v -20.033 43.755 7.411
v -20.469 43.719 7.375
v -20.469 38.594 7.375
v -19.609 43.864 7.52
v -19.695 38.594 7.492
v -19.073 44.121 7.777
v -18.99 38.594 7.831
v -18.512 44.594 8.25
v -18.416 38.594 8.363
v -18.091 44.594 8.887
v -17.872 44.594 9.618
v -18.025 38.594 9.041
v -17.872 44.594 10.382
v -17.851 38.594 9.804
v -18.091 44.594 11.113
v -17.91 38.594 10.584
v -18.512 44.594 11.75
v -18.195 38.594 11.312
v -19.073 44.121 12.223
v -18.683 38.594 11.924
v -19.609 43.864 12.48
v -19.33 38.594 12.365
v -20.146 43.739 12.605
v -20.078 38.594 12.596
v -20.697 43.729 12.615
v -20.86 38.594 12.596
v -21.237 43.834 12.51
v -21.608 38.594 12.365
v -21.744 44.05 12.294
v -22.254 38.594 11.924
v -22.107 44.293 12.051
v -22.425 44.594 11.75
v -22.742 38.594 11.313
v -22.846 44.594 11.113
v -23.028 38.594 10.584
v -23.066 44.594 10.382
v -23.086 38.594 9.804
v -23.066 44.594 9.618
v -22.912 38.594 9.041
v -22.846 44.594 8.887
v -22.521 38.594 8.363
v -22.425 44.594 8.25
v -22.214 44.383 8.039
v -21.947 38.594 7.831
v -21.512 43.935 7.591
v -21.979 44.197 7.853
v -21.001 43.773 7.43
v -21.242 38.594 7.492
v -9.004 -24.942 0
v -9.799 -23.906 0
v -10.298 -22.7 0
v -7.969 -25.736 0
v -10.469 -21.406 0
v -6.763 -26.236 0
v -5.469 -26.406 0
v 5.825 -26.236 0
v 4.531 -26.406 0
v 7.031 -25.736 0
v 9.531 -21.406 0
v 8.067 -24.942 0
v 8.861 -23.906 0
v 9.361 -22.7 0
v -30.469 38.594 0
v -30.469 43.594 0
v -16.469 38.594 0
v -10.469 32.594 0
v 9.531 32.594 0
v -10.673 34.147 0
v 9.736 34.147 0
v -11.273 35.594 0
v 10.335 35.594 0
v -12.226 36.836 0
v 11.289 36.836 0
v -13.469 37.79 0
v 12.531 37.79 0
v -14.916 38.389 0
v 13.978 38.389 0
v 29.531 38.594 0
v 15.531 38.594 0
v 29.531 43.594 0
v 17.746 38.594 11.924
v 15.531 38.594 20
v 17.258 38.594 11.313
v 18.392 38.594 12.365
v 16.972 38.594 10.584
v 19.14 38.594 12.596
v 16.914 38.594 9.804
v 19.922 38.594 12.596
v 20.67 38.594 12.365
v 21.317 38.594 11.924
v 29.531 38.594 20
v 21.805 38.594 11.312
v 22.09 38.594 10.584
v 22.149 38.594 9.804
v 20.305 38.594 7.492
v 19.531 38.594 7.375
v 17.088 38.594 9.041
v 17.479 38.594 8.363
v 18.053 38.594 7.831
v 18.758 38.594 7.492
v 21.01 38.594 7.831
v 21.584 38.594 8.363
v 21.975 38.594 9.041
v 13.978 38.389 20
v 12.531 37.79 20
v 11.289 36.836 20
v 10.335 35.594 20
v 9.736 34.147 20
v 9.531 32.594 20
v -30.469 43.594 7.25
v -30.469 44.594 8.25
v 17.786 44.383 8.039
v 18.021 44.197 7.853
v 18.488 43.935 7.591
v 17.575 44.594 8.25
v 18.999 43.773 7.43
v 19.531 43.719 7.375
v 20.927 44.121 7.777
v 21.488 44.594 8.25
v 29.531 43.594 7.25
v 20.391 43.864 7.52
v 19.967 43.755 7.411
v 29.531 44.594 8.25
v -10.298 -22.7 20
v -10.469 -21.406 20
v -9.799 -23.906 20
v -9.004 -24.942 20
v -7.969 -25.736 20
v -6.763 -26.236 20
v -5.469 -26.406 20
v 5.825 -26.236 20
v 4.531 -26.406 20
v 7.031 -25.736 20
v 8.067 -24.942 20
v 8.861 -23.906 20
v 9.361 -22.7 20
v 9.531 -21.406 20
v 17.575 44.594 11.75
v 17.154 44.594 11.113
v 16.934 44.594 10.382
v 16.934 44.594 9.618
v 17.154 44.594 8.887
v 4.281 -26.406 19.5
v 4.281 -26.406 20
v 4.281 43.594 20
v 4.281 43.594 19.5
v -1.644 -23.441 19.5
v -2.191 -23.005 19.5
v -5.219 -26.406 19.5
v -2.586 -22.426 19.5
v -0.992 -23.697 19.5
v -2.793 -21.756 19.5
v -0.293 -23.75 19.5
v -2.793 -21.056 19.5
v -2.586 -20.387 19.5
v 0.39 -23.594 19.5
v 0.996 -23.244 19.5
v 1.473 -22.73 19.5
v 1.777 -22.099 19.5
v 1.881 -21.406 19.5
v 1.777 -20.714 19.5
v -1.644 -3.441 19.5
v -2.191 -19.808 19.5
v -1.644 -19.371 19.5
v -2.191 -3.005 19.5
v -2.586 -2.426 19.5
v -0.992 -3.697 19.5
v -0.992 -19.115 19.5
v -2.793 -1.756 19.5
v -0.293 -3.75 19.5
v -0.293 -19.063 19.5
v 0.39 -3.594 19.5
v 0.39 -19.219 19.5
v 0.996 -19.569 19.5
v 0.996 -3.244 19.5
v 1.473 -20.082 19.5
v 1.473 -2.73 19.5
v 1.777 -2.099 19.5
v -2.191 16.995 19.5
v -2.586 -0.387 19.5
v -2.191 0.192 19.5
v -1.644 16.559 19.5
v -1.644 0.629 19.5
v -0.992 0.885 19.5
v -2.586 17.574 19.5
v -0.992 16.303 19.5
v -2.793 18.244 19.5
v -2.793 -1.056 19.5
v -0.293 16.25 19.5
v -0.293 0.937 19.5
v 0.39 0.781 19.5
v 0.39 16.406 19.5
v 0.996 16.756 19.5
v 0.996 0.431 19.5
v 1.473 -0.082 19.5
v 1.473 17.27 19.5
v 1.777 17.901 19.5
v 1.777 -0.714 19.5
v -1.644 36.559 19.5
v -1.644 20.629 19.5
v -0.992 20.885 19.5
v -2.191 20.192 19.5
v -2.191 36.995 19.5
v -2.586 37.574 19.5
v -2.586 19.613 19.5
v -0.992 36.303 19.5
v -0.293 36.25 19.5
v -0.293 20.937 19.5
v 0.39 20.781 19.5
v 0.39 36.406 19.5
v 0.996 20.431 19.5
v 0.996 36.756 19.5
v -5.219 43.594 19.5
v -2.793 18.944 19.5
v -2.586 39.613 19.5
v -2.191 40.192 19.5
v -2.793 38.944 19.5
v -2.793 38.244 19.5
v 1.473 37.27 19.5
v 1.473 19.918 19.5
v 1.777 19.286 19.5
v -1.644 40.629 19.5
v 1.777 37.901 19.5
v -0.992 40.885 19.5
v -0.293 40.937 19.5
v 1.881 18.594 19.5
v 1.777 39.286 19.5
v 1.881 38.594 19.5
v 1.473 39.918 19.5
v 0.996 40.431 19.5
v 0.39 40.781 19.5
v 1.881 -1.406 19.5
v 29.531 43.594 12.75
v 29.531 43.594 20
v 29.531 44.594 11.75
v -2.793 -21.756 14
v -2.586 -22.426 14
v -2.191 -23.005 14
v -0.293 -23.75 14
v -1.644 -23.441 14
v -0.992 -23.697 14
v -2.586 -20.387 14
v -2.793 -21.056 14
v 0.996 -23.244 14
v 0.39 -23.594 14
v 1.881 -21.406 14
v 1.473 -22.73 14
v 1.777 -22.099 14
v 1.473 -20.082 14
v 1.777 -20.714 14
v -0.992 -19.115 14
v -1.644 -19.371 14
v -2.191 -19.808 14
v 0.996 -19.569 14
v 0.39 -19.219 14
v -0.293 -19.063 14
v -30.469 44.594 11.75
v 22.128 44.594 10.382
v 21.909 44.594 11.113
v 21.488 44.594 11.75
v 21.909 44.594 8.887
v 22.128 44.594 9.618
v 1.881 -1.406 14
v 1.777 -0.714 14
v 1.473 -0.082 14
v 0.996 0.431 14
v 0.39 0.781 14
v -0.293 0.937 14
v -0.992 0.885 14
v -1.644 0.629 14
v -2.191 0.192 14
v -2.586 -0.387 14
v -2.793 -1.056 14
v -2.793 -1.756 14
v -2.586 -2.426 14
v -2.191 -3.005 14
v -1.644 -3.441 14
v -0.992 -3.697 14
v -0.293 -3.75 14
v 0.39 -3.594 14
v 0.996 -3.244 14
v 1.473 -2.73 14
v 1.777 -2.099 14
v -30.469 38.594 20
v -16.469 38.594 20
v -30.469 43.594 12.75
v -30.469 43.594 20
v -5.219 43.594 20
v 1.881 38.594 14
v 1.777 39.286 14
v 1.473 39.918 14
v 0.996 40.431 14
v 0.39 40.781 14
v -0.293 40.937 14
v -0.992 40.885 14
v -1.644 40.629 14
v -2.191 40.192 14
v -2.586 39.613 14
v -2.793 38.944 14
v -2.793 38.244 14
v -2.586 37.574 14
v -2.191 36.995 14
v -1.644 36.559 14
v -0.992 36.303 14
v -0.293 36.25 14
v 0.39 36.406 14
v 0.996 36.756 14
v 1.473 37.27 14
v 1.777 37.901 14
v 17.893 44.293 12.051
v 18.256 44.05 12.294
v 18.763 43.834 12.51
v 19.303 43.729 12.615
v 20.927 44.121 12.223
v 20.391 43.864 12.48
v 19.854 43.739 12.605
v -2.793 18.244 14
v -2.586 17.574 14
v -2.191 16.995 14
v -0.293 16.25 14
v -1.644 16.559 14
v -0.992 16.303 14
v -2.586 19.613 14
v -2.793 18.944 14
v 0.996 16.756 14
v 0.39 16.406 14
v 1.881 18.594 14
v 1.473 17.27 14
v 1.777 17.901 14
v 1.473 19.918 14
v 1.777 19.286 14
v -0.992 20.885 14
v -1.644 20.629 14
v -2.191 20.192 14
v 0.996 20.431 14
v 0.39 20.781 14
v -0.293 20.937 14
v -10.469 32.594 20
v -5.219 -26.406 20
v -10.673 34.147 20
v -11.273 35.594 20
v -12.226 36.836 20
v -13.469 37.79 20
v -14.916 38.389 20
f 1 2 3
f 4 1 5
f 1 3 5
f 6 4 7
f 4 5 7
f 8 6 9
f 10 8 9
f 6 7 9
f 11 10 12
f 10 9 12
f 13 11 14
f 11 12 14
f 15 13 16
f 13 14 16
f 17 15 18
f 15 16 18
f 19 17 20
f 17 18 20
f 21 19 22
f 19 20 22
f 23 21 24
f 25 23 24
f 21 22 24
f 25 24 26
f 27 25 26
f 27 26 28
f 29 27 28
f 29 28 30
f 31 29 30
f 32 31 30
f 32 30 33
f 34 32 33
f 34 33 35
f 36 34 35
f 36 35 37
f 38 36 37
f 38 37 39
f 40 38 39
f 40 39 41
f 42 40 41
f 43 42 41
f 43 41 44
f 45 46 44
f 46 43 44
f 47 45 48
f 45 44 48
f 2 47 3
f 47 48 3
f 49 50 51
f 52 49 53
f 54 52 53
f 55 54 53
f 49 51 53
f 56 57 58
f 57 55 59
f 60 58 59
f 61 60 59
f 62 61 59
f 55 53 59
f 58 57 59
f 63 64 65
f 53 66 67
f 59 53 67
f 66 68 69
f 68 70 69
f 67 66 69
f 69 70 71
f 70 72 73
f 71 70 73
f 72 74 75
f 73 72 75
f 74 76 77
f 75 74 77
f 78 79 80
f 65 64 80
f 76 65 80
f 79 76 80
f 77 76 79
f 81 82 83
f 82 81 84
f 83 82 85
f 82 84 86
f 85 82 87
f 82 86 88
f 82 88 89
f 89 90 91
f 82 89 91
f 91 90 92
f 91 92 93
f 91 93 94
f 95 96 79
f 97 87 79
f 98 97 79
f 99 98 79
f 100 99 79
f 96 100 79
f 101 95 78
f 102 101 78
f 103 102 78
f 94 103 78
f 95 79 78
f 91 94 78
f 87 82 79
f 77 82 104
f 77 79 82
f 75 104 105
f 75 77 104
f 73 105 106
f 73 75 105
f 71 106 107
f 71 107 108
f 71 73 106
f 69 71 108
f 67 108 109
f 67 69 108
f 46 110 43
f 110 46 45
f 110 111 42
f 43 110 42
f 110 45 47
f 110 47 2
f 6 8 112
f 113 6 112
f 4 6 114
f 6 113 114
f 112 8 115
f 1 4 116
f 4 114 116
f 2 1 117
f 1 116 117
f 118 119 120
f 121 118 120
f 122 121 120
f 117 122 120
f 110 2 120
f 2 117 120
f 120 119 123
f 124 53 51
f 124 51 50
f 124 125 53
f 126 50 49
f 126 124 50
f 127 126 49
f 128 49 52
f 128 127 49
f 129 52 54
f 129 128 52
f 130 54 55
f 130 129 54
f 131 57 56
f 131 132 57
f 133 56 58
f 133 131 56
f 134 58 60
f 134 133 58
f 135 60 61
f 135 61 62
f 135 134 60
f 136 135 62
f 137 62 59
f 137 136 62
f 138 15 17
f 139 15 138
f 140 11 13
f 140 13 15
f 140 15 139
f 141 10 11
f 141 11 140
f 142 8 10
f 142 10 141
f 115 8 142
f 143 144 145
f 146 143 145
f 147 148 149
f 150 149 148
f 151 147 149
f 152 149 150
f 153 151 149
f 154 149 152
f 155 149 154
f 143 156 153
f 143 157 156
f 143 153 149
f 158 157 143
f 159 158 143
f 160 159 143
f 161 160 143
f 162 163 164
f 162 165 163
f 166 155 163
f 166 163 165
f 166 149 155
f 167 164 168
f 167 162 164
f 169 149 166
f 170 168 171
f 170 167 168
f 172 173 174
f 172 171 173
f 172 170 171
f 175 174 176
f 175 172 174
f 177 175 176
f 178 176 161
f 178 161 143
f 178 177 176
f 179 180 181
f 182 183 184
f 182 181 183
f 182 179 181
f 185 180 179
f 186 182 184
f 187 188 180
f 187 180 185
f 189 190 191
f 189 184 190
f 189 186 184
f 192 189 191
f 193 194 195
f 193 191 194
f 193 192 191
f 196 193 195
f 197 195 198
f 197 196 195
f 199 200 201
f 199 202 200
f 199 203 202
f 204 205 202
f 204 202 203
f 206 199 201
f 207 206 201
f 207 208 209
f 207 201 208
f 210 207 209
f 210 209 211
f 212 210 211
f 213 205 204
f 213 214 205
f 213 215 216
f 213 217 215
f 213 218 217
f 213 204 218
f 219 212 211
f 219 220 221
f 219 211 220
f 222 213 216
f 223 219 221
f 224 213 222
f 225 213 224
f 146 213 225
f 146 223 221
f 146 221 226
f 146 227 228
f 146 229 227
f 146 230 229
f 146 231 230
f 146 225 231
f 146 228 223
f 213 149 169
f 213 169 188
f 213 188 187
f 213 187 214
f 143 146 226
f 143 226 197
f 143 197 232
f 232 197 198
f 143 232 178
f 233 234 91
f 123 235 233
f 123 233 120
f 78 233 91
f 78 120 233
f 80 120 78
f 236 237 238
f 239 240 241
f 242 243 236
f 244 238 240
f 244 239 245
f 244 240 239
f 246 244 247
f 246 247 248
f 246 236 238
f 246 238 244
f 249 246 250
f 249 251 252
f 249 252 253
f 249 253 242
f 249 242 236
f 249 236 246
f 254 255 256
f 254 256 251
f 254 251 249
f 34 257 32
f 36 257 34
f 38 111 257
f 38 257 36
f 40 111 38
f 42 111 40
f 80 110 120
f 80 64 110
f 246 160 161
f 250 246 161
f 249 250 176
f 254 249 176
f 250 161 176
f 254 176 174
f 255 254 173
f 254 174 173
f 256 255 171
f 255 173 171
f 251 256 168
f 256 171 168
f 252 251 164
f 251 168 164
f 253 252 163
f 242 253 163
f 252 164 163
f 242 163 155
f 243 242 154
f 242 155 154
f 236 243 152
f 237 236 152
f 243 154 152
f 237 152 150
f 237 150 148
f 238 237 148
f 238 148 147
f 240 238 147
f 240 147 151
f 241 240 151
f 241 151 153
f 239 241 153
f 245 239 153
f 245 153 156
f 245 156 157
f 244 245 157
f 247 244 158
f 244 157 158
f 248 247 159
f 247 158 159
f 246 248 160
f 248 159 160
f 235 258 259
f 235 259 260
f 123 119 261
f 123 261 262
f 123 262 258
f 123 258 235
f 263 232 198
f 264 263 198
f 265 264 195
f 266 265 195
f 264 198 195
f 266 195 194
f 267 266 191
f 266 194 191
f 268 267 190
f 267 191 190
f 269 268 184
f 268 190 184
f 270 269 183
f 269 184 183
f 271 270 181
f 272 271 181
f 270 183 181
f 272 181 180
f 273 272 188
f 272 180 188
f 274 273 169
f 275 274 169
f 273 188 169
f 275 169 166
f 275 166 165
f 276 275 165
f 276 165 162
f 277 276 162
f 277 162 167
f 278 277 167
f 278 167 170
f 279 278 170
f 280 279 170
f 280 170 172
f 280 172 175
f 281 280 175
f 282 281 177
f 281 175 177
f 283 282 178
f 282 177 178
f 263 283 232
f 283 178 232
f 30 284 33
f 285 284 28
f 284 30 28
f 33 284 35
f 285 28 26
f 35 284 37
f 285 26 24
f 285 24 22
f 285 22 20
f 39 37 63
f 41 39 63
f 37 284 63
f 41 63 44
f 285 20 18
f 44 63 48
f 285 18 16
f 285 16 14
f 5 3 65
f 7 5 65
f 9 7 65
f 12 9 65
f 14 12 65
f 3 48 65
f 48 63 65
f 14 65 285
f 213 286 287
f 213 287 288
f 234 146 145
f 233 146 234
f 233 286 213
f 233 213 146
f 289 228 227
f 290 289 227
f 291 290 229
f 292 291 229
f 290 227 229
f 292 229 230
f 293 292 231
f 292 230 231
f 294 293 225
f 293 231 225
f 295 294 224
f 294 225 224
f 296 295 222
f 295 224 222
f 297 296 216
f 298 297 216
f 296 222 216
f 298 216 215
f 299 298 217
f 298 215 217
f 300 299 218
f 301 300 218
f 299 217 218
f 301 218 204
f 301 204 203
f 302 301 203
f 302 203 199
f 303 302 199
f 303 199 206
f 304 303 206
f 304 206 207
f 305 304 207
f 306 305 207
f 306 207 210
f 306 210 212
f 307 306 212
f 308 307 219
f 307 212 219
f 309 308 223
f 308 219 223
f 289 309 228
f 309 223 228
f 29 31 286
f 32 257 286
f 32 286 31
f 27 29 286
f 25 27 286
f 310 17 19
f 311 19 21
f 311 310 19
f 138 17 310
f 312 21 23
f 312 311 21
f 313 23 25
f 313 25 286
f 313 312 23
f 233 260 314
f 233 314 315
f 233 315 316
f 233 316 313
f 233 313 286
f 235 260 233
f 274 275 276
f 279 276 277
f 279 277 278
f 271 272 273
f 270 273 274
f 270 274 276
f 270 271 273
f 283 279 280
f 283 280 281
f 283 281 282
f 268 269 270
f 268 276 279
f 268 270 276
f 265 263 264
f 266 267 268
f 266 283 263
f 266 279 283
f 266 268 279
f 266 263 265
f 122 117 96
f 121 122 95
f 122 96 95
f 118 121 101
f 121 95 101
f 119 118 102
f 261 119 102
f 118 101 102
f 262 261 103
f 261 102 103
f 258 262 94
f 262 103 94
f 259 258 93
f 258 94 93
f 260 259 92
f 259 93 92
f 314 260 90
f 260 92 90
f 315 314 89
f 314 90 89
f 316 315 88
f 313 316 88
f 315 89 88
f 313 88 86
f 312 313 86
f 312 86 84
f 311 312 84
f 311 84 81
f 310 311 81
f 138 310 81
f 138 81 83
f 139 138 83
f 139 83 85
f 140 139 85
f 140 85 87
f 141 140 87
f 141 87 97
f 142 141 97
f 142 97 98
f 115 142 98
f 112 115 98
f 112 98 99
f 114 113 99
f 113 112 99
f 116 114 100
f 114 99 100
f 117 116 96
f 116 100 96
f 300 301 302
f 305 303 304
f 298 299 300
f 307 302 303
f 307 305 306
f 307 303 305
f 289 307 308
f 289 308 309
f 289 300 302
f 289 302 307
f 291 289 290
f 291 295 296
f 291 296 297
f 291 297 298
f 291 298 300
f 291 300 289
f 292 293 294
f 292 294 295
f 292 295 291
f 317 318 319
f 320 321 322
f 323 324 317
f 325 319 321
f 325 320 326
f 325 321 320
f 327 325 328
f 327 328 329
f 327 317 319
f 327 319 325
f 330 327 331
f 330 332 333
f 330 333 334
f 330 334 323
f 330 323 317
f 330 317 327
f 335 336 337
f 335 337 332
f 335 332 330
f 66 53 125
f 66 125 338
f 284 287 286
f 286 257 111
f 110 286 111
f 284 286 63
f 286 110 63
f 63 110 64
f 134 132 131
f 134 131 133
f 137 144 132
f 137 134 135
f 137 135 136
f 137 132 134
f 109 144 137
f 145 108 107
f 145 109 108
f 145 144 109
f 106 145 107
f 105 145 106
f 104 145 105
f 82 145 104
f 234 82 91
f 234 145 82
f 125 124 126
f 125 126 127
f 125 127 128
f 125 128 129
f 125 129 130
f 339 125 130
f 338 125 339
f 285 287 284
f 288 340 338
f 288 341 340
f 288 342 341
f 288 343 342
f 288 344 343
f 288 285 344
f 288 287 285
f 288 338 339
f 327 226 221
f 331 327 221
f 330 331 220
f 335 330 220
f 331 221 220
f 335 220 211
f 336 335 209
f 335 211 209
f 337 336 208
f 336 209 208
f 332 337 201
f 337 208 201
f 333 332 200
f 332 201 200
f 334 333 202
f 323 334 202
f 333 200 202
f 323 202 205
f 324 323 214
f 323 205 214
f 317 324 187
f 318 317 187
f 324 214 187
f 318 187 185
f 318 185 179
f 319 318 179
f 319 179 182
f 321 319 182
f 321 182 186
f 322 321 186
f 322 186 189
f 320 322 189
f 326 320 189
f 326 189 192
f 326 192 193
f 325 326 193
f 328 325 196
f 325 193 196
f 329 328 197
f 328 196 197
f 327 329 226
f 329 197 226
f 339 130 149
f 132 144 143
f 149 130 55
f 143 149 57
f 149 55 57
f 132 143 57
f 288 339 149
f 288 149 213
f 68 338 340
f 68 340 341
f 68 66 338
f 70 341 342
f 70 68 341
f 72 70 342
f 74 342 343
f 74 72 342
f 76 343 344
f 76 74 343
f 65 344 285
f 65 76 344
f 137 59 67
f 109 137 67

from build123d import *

# Parameters (mm, degrees)
SKETCH2_W           = 20
SKETCH2_H           = 70
BOSS_EXTRUDE1_DEPTH = 20
SKETCH3_W           = 9.5
SKETCH3_H           = 70
CUT_EXTRUDE1_DEPTH  = 0.5
SKETCH4_R           = 2.35
CUT_EXTRUDE2_DEPTH  = 5.5
SKETCH5_W           = 20
SKETCH5_H           = 20
BOSS_EXTRUDE2_DEPTH = 5
FILLET1_R           = 6
FILLET2_R           = 6
SKETCH6_W           = 60
SKETCH6_H           = 5.5
BOSS_EXTRUDE3_DEPTH = 1
CHAMFER1_SIZE       = 1
SKETCH7_R           = 2.625
CUT_EXTRUDE3_DEPTH  = 75.520767082
FILLET3_R           = 5
FILLET4_R           = 5


with BuildPart() as part:
    # Sketch2 → Boss-Extrude1 (new body)
    with BuildSketch(Plane.XY):
        with Locations((-0.46875, 8.59375)):
            Rectangle(SKETCH2_W, SKETCH2_H)
    extrude(amount=BOSS_EXTRUDE1_DEPTH)

    # Sketch3 → Cut-Extrude1 (cut)
    with BuildSketch(Plane.XY.offset(20)):
        with Locations((-0.46875, 8.59375)):
            Rectangle(SKETCH3_W, SKETCH3_H)
    extrude(amount=-CUT_EXTRUDE1_DEPTH, mode=Mode.SUBTRACT)

    # Sketch4 → Cut-Extrude2 (cut)
    with BuildSketch(Plane.XY.offset(19.5)):
        with Locations((-0.46875, 38.59375)):
            Circle(SKETCH4_R)
        with Locations((-0.46875, 18.59375)):
            Circle(SKETCH4_R)
        with Locations((-0.46875, -1.40625)):
            Circle(SKETCH4_R)
        with Locations((-0.46875, 78.59375)):
            Circle(SKETCH4_R)
        with Locations((-0.46875, -21.40625)):
            Circle(SKETCH4_R)
        with Locations((-0.46875, 58.59375)):
            Circle(SKETCH4_R)
    extrude(amount=-CUT_EXTRUDE2_DEPTH, mode=Mode.SUBTRACT)

    # Sketch5 → Boss-Extrude2 (add)
    with BuildSketch(Plane(origin=(0, 43.59375, 0), x_dir=(1, 0, 0), z_dir=(0, 1, 0))):
        with Locations((19.53125, -10)):
            Rectangle(SKETCH5_W, SKETCH5_H)
        with Locations((-20.46875, -10)):
            Rectangle(SKETCH5_W, SKETCH5_H)
    extrude(amount=-BOSS_EXTRUDE2_DEPTH)

    # Fillet1
    fillet1_edges = [part.edges().sort_by_distance(p)[0] for p in [
        (9.53125, 38.59375, 10),
    ]]
    fillet(fillet1_edges, radius=FILLET1_R)

    # Fillet2
    fillet2_edges = [part.edges().sort_by_distance(p)[0] for p in [
        (-10.46875, 38.59375, 10),
    ]]
    fillet(fillet2_edges, radius=FILLET2_R)

    # Sketch6 → Boss-Extrude3 (add)
    with BuildSketch(Plane(origin=(0, 43.59375, 0), x_dir=(1, 0, 0), z_dir=(0, 1, 0))):
        with Locations((-0.46875, -10)):
            Rectangle(SKETCH6_W, SKETCH6_H)
    extrude(amount=BOSS_EXTRUDE3_DEPTH)

    # Chamfer1
    chamfer1_edges = [part.edges().sort_by_distance(p)[0] for p in [
        (-0.46875, 44.59375, 7.25),
        (-0.46875, 44.59375, 12.75),
    ]]
    chamfer(chamfer1_edges, length=CHAMFER1_SIZE - 0.0001)  # a hair under: the kernel refuses the full size

    # Sketch7 → Cut-Extrude3 (cut, through all)
    with BuildSketch(Plane.XZ.offset(-38.59375)):
        with Locations(Location((19.53125, 10, 0), (0, 0, 270))):
            Circle(SKETCH7_R)
        with Locations(Location((-20.46875, 10, 0), (0, 0, 270))):
            Circle(SKETCH7_R)
    extrude(amount=-CUT_EXTRUDE3_DEPTH, mode=Mode.SUBTRACT)

    # Fillet3
    fillet3_edges = [part.edges().sort_by_distance(p)[0] for p in [
        (-10.46875, -26.40625, 10),
    ]]
    fillet(fillet3_edges, radius=FILLET3_R)

    # Fillet4
    fillet4_edges = [part.edges().sort_by_distance(p)[0] for p in [
        (9.53125, -26.40625, 10),
    ]]
    fillet(fillet4_edges, radius=FILLET4_R)


solid = part.part
